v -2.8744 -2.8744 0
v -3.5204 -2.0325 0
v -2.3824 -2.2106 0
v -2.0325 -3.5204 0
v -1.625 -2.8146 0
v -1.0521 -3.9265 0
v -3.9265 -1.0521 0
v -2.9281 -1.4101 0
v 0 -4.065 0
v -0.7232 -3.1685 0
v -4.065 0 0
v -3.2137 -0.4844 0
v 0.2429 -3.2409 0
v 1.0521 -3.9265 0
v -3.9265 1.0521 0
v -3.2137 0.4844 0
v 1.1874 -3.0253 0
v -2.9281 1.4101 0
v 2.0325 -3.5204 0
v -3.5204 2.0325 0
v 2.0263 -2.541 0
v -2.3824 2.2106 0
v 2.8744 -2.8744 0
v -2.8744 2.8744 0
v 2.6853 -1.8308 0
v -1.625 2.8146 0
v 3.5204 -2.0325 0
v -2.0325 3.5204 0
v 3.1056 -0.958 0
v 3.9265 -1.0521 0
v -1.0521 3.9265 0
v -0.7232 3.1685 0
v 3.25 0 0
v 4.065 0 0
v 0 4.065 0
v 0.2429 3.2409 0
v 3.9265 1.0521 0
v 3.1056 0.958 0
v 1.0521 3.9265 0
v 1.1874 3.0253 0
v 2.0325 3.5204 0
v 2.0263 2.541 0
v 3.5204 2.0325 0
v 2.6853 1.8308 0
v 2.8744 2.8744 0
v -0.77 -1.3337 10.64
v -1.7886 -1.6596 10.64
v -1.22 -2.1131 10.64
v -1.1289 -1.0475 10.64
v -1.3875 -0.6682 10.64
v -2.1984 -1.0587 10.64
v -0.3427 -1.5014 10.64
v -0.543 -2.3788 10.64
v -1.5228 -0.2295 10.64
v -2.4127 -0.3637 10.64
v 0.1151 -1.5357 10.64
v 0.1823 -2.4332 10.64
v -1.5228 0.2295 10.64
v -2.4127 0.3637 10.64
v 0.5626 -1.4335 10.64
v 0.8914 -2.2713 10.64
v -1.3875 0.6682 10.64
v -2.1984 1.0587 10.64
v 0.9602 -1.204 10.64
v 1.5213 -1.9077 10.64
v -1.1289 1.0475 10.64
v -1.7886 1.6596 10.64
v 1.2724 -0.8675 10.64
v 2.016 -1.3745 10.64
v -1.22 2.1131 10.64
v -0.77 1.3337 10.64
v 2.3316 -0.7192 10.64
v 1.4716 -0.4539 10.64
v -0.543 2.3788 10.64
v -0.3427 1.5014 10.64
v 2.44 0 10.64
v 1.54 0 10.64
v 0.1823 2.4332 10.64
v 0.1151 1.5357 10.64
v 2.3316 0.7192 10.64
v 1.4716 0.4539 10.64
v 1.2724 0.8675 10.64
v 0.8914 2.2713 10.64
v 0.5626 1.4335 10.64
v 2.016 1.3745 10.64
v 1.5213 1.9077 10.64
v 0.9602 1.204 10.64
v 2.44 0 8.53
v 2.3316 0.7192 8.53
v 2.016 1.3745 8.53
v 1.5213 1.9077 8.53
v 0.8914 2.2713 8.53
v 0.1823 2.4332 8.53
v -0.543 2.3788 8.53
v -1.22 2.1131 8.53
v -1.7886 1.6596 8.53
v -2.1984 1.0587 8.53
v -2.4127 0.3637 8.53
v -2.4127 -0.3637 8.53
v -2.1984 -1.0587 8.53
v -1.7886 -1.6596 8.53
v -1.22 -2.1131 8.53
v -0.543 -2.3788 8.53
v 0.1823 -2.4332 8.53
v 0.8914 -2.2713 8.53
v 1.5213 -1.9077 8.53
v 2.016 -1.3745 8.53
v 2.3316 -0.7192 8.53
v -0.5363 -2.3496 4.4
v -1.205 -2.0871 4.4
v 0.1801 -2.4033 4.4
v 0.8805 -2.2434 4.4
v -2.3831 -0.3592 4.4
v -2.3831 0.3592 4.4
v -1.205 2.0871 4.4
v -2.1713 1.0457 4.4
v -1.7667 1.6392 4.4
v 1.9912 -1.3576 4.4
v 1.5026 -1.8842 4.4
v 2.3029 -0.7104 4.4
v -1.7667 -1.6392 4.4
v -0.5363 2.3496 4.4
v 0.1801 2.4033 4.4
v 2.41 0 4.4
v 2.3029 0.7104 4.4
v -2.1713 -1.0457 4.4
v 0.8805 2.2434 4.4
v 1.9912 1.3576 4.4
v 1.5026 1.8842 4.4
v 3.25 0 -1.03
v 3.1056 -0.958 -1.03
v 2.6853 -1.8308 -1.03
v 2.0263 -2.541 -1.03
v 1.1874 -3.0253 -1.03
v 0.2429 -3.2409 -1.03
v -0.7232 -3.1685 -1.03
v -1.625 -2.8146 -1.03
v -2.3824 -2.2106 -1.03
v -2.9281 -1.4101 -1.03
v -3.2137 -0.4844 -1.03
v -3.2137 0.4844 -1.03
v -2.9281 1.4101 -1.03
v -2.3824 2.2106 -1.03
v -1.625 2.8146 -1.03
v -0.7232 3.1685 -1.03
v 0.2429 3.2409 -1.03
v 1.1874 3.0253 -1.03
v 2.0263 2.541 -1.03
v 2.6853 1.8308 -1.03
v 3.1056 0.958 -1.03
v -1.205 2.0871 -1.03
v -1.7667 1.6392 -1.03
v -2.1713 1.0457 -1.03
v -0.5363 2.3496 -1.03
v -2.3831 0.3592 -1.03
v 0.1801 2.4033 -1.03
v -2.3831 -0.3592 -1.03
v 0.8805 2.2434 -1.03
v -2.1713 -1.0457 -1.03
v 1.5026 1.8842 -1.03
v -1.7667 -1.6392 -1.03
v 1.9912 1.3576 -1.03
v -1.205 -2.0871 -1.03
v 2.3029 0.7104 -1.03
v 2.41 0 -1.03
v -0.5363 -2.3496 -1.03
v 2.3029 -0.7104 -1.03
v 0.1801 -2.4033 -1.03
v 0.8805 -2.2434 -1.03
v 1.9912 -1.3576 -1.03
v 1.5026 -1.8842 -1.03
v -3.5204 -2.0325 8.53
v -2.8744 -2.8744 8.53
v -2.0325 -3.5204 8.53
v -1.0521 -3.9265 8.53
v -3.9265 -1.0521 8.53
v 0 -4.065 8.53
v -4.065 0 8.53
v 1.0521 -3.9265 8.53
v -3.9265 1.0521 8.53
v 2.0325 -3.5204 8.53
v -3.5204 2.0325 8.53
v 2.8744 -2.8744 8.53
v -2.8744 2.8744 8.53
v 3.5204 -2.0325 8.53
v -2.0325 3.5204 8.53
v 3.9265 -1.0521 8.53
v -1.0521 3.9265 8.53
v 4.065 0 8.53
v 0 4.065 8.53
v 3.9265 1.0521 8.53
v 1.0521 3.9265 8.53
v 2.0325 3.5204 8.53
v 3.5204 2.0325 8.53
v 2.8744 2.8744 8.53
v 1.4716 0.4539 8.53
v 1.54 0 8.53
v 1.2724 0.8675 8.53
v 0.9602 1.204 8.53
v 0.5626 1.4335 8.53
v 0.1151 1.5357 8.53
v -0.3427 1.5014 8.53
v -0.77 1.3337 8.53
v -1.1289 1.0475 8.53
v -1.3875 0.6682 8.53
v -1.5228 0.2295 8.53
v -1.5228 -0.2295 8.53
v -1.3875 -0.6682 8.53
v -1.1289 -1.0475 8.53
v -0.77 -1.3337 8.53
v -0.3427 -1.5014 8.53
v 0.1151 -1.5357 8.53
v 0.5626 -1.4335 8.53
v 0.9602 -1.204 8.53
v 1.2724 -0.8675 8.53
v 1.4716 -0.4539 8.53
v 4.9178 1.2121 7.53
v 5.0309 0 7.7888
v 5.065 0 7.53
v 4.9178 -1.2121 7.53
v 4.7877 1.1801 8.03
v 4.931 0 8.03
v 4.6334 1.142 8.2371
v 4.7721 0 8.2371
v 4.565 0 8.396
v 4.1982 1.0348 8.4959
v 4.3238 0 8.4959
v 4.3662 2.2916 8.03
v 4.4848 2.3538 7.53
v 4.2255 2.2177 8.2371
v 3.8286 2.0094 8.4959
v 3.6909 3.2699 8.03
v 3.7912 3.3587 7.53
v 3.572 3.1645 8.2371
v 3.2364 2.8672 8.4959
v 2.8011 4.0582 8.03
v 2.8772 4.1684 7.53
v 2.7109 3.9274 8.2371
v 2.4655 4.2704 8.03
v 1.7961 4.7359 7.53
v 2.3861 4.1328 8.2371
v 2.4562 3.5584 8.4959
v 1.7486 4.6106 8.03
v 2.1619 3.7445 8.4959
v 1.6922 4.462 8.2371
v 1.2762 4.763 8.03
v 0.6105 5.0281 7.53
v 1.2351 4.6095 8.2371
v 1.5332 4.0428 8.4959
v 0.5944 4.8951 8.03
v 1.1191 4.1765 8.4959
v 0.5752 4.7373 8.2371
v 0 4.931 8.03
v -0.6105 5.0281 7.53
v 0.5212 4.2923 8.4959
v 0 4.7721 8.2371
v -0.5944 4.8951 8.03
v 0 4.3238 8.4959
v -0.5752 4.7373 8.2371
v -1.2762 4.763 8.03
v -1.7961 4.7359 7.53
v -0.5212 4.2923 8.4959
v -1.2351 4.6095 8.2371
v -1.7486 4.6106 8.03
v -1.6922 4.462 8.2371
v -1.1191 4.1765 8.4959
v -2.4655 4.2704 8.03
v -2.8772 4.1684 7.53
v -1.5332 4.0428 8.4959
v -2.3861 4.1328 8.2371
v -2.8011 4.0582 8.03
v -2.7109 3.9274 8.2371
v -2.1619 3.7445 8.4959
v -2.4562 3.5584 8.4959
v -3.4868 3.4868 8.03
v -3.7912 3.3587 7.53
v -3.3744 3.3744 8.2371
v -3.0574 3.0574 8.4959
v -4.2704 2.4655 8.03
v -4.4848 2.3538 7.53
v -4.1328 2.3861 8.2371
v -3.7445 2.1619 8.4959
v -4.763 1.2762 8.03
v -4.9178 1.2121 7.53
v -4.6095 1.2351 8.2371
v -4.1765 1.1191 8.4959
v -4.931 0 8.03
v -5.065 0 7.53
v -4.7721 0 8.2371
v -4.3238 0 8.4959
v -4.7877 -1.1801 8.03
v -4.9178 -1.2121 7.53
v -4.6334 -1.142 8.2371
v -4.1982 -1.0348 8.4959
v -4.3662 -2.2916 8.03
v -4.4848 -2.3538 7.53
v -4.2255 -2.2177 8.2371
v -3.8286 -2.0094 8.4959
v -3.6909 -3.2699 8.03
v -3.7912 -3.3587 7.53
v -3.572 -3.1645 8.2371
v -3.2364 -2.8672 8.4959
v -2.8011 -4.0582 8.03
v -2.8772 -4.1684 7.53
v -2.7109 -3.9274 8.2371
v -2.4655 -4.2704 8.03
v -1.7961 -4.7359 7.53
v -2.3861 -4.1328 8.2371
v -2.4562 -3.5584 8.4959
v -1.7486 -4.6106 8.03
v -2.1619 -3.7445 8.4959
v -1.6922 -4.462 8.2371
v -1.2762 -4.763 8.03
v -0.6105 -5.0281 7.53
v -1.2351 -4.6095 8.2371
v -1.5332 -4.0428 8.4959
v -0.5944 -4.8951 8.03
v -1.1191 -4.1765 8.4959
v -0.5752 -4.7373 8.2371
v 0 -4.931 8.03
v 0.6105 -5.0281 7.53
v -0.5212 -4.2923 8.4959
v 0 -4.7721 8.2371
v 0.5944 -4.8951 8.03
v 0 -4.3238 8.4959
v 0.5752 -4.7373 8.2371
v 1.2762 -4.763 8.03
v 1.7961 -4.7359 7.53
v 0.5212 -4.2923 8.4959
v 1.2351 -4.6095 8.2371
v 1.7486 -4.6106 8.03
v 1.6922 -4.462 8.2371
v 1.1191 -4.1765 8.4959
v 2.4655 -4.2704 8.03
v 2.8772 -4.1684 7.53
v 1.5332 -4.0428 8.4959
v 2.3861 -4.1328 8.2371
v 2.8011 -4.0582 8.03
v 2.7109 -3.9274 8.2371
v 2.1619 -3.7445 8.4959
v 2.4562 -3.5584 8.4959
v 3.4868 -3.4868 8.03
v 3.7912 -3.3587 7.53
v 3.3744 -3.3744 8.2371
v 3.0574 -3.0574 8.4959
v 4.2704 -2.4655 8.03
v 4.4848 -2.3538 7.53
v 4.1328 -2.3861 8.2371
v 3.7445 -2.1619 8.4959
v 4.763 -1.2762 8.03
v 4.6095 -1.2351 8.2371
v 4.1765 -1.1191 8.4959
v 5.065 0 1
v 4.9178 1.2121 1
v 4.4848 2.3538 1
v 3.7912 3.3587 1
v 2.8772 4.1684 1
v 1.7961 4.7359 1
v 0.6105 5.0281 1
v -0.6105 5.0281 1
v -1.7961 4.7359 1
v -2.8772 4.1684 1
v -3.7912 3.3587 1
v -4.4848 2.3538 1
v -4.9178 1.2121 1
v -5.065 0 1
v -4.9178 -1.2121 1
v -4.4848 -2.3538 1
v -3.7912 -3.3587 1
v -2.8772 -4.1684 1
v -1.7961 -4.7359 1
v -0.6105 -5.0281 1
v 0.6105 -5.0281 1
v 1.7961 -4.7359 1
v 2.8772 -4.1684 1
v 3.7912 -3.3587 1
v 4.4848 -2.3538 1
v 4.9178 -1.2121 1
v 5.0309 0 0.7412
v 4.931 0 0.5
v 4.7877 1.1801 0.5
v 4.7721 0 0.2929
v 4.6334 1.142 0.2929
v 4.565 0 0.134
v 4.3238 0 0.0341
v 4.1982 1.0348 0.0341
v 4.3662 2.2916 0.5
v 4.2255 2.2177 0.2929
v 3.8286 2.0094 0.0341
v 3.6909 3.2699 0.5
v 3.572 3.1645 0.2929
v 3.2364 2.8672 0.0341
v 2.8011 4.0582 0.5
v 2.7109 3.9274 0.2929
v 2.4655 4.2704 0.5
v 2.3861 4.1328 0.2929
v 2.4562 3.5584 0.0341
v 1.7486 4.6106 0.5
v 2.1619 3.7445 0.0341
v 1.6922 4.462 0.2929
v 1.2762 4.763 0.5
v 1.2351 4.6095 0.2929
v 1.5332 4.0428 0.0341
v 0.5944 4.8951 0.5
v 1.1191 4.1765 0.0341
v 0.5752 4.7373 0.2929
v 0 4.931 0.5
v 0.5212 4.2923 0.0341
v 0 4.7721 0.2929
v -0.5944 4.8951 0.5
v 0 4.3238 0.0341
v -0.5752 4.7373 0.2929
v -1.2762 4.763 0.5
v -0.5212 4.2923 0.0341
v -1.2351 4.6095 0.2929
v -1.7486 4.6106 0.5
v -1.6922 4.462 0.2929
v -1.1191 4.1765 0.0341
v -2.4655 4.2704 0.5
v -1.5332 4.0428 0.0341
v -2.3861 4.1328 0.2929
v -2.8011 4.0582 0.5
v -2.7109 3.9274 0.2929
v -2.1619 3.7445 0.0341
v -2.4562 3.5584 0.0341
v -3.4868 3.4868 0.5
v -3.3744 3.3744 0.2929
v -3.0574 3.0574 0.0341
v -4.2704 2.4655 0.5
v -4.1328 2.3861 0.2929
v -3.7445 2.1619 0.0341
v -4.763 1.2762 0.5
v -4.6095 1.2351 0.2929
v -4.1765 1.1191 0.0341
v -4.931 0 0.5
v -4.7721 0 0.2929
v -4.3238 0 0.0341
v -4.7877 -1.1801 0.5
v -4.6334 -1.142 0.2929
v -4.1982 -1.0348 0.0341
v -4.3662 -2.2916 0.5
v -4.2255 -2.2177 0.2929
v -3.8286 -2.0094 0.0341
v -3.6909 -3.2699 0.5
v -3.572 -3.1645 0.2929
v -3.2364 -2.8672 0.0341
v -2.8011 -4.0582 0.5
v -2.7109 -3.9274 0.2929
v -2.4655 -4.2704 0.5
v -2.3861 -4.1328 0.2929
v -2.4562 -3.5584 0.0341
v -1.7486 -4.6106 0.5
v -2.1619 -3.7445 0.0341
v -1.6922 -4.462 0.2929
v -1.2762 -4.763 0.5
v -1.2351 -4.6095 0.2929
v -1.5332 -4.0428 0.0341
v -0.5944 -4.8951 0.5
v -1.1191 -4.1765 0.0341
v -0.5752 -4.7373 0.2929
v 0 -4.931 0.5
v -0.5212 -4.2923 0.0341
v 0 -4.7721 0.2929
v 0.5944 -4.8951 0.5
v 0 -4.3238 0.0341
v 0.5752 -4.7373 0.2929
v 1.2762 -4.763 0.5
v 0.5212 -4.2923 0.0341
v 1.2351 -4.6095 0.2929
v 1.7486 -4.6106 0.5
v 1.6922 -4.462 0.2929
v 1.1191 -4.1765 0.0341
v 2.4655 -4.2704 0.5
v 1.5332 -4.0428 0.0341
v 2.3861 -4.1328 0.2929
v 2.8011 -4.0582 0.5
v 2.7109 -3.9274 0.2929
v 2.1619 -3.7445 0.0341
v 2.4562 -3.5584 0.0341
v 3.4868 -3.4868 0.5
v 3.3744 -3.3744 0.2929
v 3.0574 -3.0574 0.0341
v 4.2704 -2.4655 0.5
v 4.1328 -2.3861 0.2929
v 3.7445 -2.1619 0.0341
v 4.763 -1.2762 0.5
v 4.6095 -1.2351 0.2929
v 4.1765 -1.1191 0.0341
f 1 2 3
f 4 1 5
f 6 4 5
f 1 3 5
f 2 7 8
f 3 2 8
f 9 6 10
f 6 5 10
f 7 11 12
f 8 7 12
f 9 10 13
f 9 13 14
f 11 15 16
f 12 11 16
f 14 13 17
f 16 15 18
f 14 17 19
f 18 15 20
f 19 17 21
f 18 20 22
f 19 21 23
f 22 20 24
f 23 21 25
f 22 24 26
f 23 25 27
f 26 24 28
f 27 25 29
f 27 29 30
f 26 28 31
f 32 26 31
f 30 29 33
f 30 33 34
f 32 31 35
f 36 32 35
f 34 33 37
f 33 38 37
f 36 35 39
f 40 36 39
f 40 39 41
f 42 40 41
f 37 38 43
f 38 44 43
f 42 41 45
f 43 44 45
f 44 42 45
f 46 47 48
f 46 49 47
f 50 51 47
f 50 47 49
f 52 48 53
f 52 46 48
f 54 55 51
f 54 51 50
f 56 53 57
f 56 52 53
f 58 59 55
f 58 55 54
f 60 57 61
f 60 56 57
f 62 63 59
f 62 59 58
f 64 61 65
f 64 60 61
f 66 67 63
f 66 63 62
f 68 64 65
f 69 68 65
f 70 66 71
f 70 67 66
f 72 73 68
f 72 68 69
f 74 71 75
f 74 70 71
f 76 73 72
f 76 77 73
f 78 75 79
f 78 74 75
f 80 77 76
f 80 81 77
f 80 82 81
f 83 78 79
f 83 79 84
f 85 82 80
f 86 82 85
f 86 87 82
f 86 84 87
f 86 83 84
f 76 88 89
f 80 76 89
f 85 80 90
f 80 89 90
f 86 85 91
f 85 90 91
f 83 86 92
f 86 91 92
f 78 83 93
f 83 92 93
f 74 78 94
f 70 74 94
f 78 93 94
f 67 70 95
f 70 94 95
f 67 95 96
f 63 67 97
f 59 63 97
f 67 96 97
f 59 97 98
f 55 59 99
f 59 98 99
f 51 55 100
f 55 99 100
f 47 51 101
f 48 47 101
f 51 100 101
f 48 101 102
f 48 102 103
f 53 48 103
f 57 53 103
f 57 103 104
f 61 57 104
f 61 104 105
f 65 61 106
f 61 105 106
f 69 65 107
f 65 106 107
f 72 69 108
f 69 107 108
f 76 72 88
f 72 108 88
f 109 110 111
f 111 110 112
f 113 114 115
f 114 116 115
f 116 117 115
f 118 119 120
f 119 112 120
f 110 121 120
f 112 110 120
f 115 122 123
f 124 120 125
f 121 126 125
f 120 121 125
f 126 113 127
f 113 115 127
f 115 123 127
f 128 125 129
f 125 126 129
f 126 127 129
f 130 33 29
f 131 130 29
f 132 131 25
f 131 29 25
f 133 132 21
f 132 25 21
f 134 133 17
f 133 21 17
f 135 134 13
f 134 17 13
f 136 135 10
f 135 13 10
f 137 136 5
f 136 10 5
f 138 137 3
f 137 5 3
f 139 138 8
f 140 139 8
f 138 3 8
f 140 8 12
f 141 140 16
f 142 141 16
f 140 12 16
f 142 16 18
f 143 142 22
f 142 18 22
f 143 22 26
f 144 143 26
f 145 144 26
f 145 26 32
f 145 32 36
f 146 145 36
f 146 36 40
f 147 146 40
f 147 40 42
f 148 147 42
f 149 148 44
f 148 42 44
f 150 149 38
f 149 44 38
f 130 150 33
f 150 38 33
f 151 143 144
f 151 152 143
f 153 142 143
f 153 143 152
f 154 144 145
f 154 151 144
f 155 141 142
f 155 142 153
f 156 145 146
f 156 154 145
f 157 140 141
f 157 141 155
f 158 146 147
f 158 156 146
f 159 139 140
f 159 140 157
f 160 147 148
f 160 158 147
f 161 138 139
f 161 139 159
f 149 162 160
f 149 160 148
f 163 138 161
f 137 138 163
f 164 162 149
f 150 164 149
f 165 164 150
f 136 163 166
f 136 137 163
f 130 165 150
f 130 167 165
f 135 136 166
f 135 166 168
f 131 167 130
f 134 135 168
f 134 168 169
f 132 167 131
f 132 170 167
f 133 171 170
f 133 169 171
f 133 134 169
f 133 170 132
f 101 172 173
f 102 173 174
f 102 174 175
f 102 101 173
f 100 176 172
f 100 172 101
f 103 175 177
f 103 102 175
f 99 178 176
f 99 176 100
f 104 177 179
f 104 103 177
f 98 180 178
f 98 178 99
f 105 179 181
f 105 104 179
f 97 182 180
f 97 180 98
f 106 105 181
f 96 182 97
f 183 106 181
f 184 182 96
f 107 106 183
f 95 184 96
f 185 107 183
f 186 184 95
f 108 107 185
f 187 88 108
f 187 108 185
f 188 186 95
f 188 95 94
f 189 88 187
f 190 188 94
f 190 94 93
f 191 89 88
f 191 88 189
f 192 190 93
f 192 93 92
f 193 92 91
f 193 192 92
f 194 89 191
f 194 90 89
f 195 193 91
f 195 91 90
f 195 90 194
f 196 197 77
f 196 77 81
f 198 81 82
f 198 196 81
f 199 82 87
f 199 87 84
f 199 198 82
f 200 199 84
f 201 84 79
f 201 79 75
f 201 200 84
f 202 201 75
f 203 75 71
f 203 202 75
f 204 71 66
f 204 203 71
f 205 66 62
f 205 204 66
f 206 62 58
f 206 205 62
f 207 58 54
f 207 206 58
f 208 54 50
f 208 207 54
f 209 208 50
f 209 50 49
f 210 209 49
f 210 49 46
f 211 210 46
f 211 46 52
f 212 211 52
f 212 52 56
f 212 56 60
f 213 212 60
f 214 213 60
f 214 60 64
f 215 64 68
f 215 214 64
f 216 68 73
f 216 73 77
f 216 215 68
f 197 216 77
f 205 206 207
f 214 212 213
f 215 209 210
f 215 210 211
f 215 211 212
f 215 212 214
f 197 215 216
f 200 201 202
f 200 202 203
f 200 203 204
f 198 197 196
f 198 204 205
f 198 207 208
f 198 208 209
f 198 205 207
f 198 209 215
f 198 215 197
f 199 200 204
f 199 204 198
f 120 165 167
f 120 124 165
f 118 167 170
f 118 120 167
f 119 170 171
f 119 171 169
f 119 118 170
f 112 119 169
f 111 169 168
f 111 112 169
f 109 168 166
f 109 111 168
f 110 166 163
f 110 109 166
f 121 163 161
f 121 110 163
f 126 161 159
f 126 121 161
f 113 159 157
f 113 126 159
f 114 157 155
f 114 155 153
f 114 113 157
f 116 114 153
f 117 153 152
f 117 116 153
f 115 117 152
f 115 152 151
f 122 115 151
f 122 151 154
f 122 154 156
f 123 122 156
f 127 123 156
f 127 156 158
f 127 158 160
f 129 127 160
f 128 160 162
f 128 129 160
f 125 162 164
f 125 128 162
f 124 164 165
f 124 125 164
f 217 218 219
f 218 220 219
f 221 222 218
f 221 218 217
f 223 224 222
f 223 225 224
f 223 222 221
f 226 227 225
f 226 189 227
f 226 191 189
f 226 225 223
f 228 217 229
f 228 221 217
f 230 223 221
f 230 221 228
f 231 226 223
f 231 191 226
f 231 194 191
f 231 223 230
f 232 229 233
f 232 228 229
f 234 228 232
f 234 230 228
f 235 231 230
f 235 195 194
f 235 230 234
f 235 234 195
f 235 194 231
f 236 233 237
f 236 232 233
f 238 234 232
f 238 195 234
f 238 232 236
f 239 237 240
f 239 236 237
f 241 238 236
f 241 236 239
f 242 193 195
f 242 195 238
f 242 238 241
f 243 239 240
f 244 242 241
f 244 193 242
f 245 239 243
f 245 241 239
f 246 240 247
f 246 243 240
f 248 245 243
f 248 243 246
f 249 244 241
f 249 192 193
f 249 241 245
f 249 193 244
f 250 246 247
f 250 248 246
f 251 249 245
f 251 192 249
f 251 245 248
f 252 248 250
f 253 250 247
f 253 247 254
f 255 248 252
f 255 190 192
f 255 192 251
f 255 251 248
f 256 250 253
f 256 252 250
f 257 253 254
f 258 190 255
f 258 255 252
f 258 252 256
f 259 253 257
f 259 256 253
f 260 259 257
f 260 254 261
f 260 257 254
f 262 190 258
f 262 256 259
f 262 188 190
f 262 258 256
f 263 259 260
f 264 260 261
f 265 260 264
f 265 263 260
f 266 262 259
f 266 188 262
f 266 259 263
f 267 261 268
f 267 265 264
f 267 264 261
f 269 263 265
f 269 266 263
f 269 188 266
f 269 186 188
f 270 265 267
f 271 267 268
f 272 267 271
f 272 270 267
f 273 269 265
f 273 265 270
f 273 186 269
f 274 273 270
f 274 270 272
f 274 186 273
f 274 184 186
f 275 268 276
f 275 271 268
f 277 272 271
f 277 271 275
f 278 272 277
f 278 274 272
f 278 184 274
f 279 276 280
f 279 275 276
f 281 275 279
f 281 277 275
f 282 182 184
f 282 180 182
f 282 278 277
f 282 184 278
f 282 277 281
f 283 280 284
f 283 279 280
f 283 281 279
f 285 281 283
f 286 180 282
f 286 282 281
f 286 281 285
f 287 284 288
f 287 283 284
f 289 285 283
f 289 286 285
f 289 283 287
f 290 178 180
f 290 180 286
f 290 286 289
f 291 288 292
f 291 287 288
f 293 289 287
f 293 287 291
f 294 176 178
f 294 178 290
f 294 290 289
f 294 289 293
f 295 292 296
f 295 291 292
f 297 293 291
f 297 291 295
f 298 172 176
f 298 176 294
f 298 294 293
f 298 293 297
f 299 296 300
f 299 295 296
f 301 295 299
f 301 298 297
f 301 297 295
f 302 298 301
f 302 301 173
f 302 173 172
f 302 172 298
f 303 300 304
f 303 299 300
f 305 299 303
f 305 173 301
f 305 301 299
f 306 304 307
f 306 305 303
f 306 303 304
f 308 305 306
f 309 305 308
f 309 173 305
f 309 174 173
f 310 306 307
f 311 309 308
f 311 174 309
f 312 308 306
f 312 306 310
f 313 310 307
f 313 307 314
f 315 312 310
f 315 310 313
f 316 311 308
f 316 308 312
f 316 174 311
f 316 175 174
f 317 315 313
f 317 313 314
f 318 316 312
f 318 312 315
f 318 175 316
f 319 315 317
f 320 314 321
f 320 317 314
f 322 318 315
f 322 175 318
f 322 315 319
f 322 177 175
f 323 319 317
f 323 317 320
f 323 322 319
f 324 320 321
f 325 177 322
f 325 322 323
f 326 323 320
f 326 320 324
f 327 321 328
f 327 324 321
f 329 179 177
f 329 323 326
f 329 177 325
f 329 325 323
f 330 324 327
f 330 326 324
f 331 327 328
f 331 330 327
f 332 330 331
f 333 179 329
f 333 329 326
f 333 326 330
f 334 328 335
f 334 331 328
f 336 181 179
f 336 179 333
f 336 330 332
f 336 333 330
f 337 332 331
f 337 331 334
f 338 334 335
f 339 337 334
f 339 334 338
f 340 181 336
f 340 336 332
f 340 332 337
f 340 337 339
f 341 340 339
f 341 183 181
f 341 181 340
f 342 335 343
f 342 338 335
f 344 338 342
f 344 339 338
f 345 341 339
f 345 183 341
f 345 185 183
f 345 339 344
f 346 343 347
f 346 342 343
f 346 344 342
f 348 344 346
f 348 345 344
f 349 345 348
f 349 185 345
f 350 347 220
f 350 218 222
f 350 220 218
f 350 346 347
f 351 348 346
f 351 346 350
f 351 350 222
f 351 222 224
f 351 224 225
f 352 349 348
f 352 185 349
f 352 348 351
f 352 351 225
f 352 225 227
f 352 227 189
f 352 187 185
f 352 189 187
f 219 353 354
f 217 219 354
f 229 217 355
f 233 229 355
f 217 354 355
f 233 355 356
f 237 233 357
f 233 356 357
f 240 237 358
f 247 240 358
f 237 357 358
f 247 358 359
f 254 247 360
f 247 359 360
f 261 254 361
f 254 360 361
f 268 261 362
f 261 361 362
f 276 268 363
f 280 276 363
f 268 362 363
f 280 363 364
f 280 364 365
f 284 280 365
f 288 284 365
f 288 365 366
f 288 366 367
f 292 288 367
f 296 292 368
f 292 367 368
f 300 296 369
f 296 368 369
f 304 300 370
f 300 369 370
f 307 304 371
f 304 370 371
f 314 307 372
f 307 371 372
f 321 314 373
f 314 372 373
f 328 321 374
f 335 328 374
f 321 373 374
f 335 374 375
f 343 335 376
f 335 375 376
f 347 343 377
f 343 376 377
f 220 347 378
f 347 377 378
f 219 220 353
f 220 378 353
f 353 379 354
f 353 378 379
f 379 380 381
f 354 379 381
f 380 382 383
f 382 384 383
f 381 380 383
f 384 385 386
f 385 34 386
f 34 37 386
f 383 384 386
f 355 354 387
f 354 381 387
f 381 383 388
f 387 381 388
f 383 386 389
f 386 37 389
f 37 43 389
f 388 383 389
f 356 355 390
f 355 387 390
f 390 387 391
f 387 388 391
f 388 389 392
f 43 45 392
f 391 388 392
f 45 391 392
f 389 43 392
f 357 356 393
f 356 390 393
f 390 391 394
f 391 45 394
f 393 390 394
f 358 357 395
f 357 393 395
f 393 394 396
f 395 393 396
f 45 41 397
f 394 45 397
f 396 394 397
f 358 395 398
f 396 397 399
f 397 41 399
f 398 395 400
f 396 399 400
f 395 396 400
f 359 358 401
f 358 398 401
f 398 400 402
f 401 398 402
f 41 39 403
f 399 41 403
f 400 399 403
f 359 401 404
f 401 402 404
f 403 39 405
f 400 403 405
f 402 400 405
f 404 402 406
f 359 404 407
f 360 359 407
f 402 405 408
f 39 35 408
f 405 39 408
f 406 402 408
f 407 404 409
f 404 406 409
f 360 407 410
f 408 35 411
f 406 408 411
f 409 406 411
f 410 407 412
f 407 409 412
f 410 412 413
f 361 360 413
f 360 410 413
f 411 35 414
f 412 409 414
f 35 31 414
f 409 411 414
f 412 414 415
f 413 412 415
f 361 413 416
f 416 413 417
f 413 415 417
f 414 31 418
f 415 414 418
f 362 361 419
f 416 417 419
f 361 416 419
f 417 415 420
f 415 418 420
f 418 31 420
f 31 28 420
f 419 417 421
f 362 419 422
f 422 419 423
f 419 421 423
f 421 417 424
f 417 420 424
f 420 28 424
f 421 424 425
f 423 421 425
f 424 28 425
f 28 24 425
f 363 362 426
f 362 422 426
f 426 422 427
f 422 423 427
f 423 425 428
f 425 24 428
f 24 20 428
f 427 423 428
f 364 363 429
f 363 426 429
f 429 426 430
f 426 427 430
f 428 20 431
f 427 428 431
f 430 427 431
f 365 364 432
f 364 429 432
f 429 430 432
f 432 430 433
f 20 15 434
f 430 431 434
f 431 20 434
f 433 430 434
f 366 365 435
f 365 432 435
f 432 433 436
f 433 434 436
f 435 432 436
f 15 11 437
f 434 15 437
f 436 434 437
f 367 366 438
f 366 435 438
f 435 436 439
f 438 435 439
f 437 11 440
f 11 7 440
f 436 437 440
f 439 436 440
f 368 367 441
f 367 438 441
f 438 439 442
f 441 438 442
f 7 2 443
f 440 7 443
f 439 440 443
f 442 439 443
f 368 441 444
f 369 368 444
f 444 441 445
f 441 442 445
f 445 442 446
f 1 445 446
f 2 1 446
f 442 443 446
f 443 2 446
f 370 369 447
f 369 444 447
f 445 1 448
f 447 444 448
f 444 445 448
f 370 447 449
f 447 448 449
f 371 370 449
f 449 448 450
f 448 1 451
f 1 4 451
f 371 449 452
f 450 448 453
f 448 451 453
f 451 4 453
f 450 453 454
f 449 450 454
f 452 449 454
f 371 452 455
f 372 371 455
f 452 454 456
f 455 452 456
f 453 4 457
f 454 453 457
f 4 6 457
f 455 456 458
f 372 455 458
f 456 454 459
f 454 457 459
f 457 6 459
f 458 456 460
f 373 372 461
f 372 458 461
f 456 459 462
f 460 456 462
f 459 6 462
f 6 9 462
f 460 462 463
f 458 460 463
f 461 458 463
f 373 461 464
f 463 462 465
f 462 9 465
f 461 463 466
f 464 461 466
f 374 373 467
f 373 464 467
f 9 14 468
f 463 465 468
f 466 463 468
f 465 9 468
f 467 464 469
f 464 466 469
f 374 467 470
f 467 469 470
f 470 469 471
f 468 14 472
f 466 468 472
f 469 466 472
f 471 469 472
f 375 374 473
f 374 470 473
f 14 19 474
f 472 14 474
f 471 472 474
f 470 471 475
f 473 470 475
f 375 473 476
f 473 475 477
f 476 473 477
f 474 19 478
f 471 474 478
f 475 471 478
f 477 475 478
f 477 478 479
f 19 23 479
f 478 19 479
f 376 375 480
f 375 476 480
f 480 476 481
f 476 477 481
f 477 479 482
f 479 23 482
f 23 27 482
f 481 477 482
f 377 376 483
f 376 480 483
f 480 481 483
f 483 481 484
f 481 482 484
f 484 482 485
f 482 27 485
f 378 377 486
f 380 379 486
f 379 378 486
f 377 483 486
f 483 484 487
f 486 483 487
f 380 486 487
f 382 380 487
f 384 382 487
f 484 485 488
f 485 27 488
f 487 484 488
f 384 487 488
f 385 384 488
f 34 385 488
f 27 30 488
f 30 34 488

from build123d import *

# Parameters (mm, degrees)
F0_R     = 5.065
F1_DEPTH = 8.53
F2_R     = 1
F3_R     = 1
F4_R     = 2.44
F4_R_2   = 1.54
F5_DEPTH = 2.11
F6_R     = 3.25
F6_R_2   = 2.41
F7_DEPTH = 1.03
F8_DEPTH = 4.4


with BuildPart() as f1:
    # F0 (on Top) → F1 (new body)
    with BuildSketch(Plane.XY):
        Circle(F0_R)
    extrude(amount=F1_DEPTH)

    # F2
    f2_edges = [f1.edges().sort_by_distance(p)[0] for p in [
        (-5.065, 0, 8.53),
    ]]
    fillet(f2_edges, radius=F2_R)

    # F3
    f3_edges = [f1.edges().sort_by_distance(p)[0] for p in [
        (-5.065, 0, 0),
    ]]
    fillet(f3_edges, radius=F3_R)

    # F4 (on face) → F5 (join)
    with BuildSketch(Plane.XY.offset(8.53)):
        Circle(F4_R)
        Circle(F4_R_2, mode=Mode.SUBTRACT)
    extrude(amount=F5_DEPTH)

    # F6 (on face) → F7 (join)
    with BuildSketch(Plane(origin=(0, 0, 0), x_dir=(1, 0, 0), z_dir=(0, 0, -1))):
        Circle(F6_R)
        Circle(F6_R_2, mode=Mode.SUBTRACT)
    extrude(amount=F7_DEPTH)

    # F8 (cut): a face of the model
    f8_faces = [f1.faces().sort_by_distance(p)[0] for p in [
        (0, 0, 0),
    ]]
    extrude(f8_faces, amount=-F8_DEPTH, mode=Mode.SUBTRACT)


solid = f1.part
